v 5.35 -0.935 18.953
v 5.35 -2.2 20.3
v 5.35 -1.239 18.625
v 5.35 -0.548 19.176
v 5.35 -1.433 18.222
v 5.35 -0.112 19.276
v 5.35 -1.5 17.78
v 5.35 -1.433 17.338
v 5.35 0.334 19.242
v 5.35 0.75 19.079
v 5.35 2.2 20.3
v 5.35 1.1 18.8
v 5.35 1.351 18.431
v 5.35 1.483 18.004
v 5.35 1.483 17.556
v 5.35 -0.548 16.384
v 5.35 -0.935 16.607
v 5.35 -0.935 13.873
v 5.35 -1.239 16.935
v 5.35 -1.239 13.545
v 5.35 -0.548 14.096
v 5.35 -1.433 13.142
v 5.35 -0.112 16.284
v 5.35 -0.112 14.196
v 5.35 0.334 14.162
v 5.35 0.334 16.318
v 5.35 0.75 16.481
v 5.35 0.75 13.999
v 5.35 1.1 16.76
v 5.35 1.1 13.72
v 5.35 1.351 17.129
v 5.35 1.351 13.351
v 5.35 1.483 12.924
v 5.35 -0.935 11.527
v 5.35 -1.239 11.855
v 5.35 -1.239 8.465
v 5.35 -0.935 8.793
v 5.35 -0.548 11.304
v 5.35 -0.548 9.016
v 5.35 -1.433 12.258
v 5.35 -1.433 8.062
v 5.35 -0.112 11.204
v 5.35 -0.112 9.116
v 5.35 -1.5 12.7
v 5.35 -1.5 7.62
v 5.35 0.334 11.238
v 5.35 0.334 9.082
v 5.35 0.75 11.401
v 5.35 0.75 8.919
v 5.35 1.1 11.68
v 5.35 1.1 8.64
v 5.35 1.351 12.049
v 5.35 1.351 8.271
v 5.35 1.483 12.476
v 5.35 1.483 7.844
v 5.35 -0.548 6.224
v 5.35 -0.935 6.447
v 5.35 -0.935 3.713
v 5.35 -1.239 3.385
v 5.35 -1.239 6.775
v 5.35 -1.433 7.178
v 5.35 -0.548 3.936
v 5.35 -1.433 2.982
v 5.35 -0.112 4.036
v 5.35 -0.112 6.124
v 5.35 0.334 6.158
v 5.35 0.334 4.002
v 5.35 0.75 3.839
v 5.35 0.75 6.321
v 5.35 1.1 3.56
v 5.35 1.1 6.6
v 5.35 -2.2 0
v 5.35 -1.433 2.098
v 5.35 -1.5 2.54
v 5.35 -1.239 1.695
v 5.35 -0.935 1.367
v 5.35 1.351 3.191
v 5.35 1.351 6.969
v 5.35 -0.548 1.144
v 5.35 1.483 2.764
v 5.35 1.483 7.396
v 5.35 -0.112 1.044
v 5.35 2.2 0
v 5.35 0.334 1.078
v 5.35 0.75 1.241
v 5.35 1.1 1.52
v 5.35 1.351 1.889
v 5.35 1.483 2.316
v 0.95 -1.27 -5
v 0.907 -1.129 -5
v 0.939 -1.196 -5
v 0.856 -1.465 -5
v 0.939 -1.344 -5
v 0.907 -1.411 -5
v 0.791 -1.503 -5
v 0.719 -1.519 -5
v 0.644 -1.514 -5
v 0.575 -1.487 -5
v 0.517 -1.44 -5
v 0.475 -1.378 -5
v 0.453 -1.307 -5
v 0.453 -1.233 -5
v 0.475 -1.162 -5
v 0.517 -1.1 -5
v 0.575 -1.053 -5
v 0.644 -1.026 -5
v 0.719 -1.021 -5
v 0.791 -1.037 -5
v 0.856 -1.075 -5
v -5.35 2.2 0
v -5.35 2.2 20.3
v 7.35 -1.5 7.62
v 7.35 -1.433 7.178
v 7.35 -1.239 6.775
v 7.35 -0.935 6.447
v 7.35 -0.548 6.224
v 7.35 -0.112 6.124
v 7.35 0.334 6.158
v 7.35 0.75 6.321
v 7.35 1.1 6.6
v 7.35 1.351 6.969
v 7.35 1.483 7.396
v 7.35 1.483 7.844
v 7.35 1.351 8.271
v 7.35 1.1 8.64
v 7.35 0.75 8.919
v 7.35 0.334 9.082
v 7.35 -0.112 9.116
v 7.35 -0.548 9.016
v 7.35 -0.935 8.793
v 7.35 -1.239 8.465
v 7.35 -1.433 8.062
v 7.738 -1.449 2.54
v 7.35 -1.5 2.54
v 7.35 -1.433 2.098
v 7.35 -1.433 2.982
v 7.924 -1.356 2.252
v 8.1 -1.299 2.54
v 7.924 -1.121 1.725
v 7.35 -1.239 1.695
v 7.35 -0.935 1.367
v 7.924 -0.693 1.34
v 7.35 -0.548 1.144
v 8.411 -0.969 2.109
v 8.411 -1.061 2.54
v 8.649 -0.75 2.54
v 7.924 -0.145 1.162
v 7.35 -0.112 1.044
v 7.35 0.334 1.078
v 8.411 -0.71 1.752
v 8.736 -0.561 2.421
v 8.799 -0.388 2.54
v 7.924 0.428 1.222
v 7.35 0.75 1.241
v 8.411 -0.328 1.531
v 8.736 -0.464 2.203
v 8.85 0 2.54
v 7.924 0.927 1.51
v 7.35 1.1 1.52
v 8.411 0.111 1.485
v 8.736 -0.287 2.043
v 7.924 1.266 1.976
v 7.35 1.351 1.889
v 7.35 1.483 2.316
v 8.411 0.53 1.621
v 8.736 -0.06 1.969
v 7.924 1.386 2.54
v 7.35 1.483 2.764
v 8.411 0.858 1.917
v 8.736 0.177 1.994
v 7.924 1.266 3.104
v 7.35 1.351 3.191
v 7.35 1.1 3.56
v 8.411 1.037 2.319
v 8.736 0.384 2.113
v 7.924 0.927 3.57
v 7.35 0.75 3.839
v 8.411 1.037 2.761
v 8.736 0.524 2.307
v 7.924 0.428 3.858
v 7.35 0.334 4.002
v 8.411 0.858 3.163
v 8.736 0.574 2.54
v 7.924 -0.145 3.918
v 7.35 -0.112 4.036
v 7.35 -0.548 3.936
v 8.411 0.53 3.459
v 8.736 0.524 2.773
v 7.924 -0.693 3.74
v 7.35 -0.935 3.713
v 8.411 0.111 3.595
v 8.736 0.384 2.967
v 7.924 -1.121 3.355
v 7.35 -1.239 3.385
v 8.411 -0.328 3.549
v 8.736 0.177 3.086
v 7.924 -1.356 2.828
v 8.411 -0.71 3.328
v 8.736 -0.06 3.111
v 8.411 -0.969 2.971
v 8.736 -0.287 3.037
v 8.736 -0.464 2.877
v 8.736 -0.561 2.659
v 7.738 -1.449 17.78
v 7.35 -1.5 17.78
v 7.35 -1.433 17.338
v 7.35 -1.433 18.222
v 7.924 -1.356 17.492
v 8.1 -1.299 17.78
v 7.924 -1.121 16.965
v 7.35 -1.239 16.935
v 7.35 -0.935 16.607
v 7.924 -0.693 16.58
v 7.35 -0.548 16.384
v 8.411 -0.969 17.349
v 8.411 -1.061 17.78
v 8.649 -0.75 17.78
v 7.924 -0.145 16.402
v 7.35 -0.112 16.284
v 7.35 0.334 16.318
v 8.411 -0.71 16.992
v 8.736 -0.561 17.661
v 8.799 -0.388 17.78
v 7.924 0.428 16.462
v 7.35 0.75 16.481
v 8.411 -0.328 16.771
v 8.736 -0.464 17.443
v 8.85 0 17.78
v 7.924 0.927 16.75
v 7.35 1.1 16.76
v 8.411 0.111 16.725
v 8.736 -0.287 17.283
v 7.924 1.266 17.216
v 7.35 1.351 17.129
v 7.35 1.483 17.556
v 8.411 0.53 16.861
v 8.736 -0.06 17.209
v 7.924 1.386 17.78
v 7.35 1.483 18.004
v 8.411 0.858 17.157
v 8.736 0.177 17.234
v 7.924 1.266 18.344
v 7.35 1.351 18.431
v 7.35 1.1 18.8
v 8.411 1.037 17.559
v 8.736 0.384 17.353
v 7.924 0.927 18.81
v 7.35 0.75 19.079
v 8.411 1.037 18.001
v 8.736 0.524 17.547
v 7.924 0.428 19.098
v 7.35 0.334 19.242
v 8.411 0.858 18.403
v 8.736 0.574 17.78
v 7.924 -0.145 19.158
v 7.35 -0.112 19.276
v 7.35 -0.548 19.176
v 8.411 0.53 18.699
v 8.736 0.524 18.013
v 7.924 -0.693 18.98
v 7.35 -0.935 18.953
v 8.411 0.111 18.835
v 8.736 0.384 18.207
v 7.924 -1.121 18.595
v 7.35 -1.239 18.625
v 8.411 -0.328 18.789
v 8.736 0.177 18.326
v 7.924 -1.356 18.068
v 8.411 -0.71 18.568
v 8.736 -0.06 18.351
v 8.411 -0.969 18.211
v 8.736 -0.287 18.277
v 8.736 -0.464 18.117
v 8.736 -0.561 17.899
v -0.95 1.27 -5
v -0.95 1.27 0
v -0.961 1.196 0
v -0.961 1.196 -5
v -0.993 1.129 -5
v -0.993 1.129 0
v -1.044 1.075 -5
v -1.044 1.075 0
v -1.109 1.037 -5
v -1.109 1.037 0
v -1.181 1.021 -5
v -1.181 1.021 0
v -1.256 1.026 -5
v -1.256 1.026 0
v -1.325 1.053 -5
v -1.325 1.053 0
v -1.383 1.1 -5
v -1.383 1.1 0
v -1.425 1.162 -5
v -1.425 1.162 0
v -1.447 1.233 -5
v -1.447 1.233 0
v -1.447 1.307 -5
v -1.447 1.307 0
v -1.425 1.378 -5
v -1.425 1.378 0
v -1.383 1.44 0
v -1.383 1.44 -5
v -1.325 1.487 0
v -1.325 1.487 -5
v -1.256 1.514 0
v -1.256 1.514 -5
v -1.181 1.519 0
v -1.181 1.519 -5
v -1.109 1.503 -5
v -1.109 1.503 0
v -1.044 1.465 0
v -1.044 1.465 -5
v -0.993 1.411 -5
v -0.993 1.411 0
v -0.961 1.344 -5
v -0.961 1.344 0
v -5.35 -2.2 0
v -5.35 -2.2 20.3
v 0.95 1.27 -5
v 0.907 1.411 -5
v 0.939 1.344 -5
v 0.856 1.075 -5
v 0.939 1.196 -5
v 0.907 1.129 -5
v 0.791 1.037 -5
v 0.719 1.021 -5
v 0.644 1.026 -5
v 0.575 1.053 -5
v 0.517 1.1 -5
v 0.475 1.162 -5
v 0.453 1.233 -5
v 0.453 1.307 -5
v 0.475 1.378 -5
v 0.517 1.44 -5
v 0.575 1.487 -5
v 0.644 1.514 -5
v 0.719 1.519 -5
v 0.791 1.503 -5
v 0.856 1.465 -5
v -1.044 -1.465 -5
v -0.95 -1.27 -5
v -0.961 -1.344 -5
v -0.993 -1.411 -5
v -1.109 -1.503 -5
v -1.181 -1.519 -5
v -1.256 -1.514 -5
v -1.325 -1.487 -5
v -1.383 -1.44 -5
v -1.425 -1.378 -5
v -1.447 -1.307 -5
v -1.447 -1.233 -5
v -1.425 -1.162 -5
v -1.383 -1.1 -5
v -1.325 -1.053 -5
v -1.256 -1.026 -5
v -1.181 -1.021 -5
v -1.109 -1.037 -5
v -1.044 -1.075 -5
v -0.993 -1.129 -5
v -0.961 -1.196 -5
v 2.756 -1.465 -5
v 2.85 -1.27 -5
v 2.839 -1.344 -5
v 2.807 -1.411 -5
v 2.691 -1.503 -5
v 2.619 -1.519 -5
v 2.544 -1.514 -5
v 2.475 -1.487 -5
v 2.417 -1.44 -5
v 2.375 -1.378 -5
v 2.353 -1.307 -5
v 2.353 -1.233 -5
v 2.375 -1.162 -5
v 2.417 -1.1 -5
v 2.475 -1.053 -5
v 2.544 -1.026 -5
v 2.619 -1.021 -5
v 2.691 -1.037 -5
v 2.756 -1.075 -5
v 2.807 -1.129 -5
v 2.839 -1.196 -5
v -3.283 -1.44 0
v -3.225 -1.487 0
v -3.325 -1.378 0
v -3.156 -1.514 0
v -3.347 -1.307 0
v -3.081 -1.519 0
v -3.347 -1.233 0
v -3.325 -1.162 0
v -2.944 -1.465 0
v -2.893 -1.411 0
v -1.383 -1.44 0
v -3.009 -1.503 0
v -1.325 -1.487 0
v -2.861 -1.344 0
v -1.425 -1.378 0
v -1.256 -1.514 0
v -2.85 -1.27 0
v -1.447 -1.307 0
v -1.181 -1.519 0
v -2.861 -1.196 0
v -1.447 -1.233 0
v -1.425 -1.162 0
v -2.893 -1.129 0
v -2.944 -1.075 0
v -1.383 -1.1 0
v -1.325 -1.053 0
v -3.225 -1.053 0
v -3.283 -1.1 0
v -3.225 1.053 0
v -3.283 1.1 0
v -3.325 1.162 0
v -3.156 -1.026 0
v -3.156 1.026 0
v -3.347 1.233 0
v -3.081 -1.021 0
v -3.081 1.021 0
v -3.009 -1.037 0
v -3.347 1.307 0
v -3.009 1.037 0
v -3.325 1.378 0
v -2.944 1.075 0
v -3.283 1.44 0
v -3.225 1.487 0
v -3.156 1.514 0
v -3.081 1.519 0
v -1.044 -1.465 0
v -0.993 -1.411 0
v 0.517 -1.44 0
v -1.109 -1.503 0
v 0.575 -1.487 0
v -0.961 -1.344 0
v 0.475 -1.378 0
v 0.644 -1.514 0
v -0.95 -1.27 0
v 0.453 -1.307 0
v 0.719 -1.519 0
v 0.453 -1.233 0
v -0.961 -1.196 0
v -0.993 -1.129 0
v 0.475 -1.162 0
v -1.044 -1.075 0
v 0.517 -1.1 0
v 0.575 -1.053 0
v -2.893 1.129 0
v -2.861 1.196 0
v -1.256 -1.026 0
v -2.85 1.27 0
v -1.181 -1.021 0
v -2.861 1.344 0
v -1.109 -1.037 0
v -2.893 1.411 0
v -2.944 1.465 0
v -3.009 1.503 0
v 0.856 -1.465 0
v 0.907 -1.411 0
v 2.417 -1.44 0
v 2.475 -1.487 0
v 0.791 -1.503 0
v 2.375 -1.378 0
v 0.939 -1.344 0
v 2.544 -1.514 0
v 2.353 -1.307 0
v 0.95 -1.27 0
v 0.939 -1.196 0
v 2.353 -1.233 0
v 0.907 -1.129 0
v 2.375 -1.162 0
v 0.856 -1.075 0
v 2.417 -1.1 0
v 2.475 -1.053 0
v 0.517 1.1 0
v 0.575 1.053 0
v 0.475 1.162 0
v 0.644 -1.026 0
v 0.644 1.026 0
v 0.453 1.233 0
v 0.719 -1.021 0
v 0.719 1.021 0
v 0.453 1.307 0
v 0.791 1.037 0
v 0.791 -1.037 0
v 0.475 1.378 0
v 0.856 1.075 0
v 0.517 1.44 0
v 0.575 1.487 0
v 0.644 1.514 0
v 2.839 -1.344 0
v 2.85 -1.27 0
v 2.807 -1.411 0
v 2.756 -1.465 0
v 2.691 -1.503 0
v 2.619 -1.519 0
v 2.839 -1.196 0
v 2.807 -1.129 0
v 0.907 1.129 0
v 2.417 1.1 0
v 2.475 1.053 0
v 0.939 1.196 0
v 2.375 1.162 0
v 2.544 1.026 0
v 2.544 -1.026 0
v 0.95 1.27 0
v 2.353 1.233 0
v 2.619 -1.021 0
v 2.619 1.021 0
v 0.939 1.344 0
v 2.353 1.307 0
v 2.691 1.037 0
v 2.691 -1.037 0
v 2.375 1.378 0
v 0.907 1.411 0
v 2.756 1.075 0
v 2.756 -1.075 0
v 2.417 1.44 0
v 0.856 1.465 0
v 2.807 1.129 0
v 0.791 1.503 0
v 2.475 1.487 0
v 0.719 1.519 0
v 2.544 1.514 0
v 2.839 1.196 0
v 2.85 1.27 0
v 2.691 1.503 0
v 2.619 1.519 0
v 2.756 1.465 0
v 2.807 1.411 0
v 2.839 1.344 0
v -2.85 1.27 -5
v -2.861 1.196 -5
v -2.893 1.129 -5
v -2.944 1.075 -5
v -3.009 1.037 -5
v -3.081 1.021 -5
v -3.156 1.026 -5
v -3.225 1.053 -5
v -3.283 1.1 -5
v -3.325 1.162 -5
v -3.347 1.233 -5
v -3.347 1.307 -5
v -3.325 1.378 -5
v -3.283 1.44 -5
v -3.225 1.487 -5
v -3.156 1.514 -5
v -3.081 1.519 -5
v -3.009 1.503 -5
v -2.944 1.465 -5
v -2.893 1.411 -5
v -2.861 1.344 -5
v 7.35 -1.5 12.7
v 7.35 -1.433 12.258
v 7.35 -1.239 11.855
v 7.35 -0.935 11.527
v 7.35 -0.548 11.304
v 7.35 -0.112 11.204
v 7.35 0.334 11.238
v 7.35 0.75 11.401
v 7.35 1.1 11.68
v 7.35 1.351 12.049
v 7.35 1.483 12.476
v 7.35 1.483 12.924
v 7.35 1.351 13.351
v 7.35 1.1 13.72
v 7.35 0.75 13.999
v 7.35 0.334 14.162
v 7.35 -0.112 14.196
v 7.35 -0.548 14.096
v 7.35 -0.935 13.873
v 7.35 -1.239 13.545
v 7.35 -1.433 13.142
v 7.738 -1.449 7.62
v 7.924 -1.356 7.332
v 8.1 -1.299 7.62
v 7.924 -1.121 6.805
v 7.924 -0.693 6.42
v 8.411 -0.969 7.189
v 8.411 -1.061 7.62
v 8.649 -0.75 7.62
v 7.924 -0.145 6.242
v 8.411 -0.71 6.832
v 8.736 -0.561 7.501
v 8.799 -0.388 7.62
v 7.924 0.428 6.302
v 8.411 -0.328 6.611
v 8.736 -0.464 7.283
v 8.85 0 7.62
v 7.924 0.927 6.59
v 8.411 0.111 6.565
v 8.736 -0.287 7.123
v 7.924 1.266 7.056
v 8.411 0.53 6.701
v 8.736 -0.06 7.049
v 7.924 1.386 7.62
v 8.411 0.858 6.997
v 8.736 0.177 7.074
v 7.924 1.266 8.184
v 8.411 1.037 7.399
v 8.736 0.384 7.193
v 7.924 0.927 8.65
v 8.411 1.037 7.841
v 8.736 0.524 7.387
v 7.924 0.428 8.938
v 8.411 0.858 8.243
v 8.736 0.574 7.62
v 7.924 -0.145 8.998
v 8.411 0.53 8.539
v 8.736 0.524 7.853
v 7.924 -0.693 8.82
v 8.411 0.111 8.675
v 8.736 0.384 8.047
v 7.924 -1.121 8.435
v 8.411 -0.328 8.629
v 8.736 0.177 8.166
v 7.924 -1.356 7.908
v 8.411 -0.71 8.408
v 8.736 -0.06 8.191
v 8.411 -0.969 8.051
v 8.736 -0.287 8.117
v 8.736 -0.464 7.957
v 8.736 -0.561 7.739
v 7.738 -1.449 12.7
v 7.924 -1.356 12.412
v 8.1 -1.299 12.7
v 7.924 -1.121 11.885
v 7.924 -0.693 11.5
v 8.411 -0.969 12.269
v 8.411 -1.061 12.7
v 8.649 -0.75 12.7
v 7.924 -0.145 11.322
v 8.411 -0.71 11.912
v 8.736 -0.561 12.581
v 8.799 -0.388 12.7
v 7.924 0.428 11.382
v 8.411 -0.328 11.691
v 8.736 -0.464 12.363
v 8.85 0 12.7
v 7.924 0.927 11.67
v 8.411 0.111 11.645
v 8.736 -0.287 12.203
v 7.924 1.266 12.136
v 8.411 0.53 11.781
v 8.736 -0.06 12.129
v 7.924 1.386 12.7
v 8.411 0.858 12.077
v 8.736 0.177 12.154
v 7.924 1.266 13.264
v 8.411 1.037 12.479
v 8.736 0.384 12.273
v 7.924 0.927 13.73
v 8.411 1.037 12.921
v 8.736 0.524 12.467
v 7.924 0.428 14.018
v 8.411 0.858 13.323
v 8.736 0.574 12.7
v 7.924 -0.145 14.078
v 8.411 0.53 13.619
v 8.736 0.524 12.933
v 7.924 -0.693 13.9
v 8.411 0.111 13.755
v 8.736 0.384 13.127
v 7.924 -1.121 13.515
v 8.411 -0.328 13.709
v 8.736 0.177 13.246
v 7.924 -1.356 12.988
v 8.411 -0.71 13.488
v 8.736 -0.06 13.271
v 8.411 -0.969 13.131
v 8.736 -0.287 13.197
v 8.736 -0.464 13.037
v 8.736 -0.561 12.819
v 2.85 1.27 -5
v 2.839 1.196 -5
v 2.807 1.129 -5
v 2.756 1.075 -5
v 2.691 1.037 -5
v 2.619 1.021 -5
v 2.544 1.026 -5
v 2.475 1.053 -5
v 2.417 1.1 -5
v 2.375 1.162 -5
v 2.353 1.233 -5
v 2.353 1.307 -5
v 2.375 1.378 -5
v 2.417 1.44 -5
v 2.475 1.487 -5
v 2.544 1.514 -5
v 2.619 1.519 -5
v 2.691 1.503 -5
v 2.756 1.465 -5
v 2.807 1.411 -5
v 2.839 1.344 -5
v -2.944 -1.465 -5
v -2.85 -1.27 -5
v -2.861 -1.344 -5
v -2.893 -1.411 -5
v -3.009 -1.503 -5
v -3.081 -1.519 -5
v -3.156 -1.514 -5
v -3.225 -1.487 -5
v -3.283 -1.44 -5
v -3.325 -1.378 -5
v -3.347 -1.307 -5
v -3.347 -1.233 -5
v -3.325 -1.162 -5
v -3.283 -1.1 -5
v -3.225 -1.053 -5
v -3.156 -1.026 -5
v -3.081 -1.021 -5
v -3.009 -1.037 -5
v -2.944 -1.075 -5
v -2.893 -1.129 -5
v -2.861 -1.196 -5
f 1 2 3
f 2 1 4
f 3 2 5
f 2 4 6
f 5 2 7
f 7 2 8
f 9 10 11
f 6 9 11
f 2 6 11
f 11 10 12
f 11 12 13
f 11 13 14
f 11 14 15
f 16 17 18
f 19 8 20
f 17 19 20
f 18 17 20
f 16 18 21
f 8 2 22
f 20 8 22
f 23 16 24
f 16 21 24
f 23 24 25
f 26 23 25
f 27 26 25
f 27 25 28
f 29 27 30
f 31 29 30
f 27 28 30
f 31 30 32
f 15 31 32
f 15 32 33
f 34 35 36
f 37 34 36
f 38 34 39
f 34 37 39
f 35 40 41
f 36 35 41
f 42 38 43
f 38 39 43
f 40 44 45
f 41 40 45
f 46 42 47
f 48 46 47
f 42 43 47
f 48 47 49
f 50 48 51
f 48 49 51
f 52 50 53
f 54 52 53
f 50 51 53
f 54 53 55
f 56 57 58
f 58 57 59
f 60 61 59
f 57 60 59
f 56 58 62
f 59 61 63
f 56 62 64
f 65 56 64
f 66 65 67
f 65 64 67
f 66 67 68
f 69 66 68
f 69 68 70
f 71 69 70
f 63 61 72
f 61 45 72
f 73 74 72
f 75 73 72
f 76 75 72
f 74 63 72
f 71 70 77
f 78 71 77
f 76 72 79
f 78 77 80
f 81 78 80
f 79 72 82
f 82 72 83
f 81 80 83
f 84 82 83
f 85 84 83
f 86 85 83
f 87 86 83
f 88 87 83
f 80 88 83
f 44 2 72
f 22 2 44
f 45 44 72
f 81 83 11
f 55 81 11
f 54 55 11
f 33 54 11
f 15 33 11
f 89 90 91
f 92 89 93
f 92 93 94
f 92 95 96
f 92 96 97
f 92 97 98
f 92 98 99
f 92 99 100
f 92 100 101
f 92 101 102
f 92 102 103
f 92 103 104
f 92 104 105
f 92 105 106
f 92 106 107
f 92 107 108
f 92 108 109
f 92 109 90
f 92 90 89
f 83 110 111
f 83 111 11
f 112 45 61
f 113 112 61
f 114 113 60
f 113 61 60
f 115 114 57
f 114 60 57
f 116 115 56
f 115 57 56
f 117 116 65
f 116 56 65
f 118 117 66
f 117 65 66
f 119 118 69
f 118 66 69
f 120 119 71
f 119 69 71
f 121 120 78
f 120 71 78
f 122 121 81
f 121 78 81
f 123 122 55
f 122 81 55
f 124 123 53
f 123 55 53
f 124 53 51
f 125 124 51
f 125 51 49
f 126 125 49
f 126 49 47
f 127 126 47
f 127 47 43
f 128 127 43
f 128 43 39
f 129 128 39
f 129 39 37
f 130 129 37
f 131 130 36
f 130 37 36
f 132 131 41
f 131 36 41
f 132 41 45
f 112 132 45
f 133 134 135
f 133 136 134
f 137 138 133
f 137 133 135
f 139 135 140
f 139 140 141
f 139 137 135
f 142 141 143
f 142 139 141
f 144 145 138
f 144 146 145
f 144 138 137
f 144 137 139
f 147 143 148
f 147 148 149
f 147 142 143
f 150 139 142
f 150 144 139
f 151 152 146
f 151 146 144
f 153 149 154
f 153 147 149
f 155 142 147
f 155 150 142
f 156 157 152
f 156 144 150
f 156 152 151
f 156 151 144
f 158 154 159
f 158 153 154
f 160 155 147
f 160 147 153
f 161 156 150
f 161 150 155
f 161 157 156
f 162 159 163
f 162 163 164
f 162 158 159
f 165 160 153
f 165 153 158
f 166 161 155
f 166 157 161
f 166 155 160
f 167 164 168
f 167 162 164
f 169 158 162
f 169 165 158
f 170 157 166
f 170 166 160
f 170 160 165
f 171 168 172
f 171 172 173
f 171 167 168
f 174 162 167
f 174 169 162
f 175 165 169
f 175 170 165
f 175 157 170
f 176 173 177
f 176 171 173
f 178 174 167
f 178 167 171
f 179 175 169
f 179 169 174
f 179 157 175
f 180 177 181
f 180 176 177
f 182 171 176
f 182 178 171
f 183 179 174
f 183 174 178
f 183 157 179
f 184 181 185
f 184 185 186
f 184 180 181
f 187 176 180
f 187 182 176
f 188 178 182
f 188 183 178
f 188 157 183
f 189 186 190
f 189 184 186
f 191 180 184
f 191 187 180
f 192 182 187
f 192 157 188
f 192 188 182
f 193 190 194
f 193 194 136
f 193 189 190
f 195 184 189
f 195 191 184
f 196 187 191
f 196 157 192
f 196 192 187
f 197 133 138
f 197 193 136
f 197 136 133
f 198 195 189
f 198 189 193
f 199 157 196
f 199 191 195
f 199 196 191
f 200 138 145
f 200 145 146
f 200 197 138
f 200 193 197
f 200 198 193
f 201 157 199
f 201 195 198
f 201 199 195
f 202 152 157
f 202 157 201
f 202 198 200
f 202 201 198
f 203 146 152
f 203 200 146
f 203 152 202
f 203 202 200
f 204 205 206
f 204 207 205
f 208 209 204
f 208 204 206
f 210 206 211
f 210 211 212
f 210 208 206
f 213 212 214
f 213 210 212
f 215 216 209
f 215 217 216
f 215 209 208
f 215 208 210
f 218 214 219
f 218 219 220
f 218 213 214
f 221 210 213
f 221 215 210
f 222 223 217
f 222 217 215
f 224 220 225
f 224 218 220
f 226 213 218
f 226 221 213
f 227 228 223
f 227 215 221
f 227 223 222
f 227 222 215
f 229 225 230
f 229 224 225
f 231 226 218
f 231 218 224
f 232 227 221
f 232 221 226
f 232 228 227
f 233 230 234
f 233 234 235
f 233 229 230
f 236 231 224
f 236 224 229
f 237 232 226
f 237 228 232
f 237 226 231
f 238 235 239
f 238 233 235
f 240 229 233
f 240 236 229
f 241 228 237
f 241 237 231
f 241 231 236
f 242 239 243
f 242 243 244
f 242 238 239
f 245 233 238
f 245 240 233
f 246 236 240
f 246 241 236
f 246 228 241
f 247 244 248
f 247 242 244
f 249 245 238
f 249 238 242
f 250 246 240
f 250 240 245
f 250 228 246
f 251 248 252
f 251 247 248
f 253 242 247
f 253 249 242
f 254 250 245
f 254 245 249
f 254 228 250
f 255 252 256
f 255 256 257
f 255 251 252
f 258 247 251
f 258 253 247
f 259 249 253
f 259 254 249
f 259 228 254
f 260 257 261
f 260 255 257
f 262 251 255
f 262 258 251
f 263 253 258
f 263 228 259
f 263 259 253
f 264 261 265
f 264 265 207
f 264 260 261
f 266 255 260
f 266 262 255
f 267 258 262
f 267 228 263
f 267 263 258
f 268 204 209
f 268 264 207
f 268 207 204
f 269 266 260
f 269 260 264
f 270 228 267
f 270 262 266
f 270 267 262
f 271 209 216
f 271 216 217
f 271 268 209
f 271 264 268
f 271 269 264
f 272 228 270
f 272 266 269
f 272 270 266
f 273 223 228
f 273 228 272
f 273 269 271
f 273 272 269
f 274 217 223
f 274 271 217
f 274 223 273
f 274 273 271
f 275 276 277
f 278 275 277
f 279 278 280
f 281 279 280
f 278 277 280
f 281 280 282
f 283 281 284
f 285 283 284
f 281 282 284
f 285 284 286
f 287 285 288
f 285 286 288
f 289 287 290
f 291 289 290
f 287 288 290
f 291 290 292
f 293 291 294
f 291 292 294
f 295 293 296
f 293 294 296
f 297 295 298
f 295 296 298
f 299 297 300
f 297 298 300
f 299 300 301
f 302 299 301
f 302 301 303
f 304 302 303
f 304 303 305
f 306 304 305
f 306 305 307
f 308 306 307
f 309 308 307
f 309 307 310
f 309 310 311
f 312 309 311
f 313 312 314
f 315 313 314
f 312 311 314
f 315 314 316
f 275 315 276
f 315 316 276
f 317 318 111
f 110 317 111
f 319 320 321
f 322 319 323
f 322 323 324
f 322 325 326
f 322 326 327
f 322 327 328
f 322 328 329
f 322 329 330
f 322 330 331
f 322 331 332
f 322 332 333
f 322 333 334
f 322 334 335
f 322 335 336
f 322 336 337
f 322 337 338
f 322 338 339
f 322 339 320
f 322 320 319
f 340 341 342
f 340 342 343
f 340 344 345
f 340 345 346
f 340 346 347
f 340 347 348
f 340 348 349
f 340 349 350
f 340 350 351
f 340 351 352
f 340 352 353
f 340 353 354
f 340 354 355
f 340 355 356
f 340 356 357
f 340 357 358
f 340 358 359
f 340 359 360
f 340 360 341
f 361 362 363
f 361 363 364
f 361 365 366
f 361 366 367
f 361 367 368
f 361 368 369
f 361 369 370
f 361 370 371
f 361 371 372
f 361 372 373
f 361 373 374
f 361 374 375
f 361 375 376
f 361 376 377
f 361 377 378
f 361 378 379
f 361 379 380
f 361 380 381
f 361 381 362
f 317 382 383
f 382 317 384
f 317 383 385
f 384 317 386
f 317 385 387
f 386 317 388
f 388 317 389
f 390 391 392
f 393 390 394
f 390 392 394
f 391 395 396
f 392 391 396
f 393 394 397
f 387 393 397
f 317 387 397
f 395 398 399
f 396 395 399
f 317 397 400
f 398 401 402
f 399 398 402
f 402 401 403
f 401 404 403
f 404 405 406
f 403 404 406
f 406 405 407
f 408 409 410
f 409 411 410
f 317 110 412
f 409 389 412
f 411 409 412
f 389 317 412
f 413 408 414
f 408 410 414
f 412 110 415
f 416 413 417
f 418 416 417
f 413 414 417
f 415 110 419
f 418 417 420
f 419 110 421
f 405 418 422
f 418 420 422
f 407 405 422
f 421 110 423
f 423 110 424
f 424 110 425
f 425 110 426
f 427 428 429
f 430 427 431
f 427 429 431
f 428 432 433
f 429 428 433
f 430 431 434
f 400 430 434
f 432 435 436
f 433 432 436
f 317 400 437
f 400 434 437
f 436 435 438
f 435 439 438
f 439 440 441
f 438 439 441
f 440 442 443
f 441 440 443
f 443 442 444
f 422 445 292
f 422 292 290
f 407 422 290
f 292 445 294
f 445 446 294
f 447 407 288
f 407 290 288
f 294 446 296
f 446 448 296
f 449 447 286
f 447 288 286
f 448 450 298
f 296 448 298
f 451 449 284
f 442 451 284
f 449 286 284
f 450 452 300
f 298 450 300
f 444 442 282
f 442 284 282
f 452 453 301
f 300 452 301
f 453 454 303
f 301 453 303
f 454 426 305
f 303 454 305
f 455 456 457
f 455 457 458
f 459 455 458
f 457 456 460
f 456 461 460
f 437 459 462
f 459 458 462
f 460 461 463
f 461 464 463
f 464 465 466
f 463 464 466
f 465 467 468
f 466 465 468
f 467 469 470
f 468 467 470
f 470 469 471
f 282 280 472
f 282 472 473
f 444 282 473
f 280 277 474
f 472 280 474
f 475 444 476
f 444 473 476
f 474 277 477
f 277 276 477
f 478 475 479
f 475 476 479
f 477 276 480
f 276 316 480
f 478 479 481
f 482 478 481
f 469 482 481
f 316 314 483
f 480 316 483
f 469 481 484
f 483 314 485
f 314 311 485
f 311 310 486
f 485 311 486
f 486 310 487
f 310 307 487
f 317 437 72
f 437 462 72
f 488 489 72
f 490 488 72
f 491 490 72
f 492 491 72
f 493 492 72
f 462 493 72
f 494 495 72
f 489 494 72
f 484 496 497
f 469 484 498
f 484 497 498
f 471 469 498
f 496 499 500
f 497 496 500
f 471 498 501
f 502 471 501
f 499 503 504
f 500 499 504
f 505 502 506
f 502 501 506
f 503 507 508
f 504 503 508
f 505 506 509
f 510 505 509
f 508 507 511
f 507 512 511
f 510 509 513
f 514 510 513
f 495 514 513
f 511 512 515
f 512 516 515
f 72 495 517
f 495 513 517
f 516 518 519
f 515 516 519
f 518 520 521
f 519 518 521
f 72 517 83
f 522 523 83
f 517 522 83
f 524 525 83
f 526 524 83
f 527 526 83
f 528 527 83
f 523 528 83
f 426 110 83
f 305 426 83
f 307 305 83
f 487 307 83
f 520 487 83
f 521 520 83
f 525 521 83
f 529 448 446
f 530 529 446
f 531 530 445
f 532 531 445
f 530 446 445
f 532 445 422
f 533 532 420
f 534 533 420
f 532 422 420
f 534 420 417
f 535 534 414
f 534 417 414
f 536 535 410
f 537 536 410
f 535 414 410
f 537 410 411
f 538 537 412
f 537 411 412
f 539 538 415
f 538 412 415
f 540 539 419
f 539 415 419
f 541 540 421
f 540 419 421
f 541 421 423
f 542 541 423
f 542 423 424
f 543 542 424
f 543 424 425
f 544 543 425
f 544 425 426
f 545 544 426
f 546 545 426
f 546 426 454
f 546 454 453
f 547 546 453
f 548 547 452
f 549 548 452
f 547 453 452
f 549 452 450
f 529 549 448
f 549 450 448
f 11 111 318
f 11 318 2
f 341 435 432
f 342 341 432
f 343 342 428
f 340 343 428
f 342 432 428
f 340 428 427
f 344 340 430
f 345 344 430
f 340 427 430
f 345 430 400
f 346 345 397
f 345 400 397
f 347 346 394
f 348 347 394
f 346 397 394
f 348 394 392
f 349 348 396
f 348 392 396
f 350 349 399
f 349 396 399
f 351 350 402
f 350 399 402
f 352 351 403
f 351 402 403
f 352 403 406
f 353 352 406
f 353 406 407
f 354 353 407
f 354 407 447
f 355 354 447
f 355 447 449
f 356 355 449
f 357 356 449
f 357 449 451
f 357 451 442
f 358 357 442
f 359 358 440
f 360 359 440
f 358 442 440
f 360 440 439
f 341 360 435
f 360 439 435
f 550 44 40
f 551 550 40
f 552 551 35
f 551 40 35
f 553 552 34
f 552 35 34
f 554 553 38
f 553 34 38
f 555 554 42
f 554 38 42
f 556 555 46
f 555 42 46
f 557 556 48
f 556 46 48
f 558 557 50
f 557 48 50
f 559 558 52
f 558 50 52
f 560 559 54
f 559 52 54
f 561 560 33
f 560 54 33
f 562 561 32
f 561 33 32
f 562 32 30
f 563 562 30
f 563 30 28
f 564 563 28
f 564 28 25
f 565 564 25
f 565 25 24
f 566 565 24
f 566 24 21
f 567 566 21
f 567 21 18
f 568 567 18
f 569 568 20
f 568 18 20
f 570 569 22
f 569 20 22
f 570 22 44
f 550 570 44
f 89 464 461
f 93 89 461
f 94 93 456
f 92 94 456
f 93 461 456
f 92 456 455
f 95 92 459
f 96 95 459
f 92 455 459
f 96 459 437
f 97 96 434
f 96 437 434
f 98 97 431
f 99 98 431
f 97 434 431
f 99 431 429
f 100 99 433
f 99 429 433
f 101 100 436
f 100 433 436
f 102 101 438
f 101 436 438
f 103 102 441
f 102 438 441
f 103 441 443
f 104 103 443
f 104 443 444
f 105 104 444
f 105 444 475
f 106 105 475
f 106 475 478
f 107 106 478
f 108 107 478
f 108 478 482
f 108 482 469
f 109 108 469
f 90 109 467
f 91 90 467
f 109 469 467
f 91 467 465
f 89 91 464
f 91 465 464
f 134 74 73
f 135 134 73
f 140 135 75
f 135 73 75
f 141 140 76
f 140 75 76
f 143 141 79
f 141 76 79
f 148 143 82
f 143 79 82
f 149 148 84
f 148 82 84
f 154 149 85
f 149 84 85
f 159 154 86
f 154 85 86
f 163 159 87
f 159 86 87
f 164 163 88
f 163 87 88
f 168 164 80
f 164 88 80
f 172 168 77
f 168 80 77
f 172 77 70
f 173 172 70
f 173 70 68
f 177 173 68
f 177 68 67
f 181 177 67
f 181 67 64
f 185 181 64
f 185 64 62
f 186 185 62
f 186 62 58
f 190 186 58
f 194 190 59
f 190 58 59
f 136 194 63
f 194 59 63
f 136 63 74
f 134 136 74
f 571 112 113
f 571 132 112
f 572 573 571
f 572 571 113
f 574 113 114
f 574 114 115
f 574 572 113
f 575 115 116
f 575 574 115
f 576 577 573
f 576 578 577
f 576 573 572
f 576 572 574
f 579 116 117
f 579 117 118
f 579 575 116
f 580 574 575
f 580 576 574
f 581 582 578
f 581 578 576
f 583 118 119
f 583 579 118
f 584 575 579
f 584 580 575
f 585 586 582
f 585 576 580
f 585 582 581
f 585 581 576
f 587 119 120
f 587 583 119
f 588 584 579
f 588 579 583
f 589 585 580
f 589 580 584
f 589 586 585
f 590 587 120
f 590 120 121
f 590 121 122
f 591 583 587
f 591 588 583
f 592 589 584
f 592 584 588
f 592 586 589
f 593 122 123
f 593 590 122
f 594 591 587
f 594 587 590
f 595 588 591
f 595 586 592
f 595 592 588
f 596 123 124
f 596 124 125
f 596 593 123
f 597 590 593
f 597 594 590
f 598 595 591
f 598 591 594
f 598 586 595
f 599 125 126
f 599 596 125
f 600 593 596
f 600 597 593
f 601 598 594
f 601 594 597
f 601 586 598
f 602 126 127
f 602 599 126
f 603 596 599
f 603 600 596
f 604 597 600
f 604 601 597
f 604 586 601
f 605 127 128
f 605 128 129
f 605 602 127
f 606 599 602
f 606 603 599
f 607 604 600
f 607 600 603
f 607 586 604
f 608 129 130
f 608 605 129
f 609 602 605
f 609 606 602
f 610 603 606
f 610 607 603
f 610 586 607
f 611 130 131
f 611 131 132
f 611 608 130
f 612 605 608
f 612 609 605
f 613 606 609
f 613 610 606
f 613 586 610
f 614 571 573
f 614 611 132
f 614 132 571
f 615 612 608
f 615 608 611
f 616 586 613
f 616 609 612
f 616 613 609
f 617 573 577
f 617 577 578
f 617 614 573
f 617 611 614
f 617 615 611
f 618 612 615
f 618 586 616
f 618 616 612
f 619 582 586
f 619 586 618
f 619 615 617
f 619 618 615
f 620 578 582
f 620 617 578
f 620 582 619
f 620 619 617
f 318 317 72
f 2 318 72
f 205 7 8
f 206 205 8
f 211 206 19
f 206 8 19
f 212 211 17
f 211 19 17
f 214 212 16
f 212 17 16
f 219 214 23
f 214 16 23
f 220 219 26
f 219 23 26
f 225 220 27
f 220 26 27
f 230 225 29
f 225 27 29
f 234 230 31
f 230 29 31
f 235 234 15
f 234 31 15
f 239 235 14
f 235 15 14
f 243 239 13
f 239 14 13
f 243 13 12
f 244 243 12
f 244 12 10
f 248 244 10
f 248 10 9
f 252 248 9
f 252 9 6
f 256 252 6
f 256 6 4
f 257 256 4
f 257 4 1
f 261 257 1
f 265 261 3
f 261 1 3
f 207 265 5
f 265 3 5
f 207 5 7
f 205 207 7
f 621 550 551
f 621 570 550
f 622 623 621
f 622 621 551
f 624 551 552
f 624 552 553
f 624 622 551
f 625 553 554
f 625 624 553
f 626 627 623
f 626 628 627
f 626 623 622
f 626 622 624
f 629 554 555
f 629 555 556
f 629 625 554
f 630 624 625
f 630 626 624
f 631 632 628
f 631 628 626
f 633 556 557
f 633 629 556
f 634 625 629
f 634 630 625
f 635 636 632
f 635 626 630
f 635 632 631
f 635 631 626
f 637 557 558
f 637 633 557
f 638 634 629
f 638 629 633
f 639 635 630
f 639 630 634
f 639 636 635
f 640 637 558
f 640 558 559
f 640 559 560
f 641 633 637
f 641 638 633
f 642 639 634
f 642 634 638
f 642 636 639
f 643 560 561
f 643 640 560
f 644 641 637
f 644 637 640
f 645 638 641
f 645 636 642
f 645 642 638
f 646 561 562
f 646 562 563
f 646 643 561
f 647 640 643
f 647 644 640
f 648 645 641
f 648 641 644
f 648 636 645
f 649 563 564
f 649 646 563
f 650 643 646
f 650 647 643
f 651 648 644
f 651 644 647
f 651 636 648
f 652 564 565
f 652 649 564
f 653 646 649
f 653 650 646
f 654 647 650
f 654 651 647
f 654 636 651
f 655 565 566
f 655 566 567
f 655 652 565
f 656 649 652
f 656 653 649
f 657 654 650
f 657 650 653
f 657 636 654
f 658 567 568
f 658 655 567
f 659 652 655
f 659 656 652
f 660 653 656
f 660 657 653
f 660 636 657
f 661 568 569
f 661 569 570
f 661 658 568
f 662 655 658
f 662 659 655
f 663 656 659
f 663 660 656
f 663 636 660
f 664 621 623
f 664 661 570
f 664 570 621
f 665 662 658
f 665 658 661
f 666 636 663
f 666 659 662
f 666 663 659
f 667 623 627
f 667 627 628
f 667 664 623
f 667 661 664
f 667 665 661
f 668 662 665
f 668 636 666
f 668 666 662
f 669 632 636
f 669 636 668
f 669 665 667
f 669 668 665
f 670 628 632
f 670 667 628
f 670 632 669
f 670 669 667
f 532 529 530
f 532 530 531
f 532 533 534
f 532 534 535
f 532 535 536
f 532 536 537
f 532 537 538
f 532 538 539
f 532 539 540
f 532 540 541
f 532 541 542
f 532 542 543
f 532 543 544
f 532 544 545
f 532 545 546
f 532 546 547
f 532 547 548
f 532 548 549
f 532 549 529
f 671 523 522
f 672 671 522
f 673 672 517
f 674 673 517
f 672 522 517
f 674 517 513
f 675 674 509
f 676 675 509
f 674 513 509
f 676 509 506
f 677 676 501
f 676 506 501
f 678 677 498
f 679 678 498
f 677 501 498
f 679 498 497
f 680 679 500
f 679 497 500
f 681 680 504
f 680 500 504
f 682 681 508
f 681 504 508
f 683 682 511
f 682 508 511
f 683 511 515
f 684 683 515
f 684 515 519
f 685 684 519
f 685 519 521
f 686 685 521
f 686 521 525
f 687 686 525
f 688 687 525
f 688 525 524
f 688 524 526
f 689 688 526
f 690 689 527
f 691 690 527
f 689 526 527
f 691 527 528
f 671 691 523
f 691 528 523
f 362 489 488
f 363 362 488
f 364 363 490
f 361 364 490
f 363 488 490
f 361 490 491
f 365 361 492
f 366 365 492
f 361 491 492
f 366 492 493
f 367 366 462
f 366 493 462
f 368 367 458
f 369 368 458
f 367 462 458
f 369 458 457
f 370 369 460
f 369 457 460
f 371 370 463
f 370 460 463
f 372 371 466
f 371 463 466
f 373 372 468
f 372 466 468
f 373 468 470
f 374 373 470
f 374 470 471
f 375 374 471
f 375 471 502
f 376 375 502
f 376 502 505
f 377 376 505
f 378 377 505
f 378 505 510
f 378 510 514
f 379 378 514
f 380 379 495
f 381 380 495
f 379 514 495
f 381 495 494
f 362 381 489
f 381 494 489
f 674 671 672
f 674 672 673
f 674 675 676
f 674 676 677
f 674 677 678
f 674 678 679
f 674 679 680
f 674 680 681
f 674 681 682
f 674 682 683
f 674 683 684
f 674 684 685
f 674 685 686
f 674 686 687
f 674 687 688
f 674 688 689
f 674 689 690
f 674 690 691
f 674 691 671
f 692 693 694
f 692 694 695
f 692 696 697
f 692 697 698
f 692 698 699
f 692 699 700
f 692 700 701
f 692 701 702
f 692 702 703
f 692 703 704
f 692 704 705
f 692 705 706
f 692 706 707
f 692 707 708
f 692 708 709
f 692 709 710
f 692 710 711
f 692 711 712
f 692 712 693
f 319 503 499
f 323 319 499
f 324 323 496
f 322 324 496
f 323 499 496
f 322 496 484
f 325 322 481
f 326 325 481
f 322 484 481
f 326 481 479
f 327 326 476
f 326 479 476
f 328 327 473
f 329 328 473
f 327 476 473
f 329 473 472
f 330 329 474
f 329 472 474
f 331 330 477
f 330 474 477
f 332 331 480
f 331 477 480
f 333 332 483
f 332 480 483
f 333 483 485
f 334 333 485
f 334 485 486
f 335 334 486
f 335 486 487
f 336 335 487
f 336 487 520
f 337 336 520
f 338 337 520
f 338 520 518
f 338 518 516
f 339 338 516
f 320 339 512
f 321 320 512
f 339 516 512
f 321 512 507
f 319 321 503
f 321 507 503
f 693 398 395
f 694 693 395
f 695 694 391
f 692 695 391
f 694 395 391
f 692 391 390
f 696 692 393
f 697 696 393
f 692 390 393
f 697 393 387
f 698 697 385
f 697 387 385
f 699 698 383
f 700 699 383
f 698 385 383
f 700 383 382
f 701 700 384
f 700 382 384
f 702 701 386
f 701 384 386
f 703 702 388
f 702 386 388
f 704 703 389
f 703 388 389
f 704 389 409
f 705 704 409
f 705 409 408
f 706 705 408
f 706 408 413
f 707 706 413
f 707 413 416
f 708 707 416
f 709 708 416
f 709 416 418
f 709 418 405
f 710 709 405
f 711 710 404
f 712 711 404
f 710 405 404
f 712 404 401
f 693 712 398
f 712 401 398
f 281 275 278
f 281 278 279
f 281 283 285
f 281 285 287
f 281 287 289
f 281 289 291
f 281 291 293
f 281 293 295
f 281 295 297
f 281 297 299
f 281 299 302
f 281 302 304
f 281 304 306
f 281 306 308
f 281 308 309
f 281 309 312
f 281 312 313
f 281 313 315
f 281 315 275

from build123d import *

# Parameters (mm, degrees)
SKETCH_1_W      = 10.7
SKETCH_1_H      = 4.4
EXTRUDE_1_DEPTH = 20.3
SKETCH_2_R      = 0.25
EXTRUDE_2_DEPTH = 5
SKETCH_3_R      = 1.5
EXTRUDE_3_DEPTH = 3.5
FILLET_1_R      = 1.5


with BuildPart() as part:
    # 草图1 → 凸台-拉伸1 (new body)
    with BuildSketch(Plane.XY):
        Rectangle(SKETCH_1_W, SKETCH_1_H)
    extrude(amount=EXTRUDE_1_DEPTH)

    # 草图2 → 凸台-拉伸2 (add)
    with BuildSketch(Plane(origin=(0, 0, 0), x_dir=(-1, 0, 0), z_dir=(0, 0, -1))):
        with Locations(Location((-2.6, 1.27, 0), (0, 0, 180))):
            Circle(SKETCH_2_R)
        with Locations(Location((-0.7, 1.27, 0), (0, 0, 180))):
            Circle(SKETCH_2_R)
        with Locations(Location((1.2, 1.27, 0), (0, 0, 180))):
            Circle(SKETCH_2_R)
        with Locations(Location((3.1, 1.27, 0), (0, 0, 180))):
            Circle(SKETCH_2_R)
        with Locations(Location((3.1, -1.27, 0), (0, 0, 180))):
            Circle(SKETCH_2_R)
        with Locations(Location((1.2, -1.27, 0), (0, 0, 180))):
            Circle(SKETCH_2_R)
        with Locations(Location((-0.7, -1.27, 0), (0, 0, 180))):
            Circle(SKETCH_2_R)
        with Locations(Location((-2.6, -1.27, 0), (0, 0, 180))):
            Circle(SKETCH_2_R)
    extrude(amount=EXTRUDE_2_DEPTH)

    # 草图3 → 凸台-拉伸3 (add)
    with BuildSketch(Plane(origin=(5.35, 0, 0), x_dir=(0, 0, -1), z_dir=(1, 0, 0))):
        with Locations(Location((-2.54, 0, 0), (0, 0, 270))):
            Circle(SKETCH_3_R)
        with Locations(Location((-7.62, 0, 0), (0, 0, 270))):
            Circle(SKETCH_3_R)
        with Locations(Location((-12.7, 0, 0), (0, 0, 270))):
            Circle(SKETCH_3_R)
        with Locations(Location((-17.78, 0, 0), (0, 0, 270))):
            Circle(SKETCH_3_R)
    extrude(amount=EXTRUDE_3_DEPTH)

    # 圆角1
    fillet_1_edges = [part.edges().sort_by_distance(p)[0] for p in [
        (8.85, 1.5, 2.54),
        (8.85, 1.5, 7.62),
        (8.85, 1.5, 12.7),
        (8.85, 1.5, 17.78),
    ]]
    fillet(fillet_1_edges, radius=FILLET_1_R)


solid = part.part
